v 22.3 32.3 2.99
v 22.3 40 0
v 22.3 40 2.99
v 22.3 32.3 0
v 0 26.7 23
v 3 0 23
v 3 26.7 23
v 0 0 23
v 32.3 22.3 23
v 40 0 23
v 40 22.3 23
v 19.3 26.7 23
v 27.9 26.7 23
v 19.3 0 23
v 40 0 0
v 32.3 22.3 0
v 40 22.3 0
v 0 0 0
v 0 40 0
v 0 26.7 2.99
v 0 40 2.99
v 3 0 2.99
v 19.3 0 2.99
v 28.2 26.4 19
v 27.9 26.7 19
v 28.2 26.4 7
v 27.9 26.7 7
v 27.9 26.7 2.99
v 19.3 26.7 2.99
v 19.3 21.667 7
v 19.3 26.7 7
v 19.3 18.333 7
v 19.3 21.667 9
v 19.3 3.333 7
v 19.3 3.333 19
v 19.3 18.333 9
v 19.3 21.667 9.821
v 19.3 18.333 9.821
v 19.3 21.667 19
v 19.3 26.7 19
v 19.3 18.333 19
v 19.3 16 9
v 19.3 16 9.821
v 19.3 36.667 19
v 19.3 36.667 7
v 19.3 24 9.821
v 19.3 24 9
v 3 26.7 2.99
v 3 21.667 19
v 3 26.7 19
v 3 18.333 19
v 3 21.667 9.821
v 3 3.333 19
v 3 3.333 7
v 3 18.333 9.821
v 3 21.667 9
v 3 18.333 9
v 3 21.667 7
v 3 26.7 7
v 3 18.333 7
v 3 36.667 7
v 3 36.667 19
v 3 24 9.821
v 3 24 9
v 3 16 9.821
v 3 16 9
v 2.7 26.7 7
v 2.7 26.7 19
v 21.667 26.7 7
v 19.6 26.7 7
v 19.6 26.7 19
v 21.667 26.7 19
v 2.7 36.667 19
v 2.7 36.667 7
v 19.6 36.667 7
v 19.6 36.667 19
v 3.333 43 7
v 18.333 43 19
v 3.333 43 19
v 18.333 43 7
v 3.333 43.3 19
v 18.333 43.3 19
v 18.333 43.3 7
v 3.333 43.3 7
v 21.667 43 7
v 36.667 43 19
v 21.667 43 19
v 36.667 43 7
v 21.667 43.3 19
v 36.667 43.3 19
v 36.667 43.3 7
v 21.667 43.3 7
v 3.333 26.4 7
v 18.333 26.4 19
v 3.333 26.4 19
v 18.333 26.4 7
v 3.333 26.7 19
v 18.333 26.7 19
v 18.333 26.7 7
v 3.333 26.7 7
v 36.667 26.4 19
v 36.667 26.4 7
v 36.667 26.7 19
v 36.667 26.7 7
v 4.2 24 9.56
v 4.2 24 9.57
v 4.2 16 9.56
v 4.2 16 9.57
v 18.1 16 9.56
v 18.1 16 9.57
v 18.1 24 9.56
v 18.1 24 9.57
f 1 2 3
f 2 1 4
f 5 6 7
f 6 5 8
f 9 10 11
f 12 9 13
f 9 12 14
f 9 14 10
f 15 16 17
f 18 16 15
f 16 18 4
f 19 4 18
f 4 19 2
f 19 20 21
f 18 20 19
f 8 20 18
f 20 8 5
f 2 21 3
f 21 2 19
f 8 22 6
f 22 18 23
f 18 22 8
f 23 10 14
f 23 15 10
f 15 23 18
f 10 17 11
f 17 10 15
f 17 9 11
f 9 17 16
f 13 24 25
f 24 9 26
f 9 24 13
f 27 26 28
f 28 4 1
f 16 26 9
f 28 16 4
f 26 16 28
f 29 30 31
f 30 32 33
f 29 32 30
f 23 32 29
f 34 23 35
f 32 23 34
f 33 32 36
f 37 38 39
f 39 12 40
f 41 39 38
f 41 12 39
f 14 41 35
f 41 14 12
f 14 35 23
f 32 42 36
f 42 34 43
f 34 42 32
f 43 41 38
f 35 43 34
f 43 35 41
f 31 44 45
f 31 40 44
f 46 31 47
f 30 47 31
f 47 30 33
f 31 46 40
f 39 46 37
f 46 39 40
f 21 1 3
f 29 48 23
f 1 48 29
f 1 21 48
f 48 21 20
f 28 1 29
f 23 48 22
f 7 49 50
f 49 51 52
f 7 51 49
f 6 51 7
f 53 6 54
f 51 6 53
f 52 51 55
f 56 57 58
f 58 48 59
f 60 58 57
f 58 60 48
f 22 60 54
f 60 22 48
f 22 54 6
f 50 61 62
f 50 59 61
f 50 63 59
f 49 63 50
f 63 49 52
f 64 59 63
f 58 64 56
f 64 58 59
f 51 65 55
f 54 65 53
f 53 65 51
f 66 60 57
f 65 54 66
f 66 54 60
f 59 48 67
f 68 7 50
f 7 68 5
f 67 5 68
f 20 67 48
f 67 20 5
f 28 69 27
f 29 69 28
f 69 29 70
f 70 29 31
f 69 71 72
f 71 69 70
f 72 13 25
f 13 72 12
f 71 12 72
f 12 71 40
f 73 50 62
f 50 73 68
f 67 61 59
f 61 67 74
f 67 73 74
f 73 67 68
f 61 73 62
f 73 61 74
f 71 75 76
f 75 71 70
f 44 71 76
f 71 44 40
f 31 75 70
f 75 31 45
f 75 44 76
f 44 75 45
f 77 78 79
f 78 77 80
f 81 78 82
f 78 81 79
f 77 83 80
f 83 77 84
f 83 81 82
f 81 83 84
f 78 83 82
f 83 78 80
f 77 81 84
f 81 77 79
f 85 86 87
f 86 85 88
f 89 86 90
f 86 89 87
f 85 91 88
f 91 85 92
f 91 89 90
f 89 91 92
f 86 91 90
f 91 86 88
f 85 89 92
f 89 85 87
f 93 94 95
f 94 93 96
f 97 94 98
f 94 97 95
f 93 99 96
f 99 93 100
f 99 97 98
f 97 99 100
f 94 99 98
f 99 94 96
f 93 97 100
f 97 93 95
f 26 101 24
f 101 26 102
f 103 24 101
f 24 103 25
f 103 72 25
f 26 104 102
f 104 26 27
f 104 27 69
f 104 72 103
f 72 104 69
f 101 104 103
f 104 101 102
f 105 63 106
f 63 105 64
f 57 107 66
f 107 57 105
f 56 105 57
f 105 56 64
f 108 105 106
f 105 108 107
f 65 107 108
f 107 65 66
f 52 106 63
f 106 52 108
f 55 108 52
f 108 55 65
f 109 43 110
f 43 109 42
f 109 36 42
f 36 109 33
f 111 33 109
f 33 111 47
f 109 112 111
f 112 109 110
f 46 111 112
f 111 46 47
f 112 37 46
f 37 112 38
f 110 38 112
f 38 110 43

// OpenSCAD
// CabinetLOCK — conectores universales para armario con tablero 16mm
// Material: PETG · Impresora: SPARKX i7 · Boquilla: 0.4mm
// Render una pieza: cambiar PIEZA al nombre deseado y exportar STL

// ══════════════════════════════════════════════════════════════
// SELECTOR DE PIEZA (cambiar aquí para renderizar)
// ══════════════════════════════════════════════════════════════
// Valores: "esquina_l", "esquina_3d", "t_interior", "soporte_balda",
//          "recto", "tapon", "union_vertical", "calibracion"
PIEZA = "esquina_l";

// ══════════════════════════════════════════════════════════════
// PARÁMETROS GLOBALES
// ══════════════════════════════════════════════════════════════

// --- Tablero ---
ESPESOR_TABLERO  = 16;      // mm — melamina/contrachapado/MDF/aglomerado
TOLERANCIA_LADO  = 0.15;    // mm por lado → canal = 16 + 2×0.15 = 16.3mm
ANCHO_CANAL      = ESPESOR_TABLERO + 2 * TOLERANCIA_LADO;

// --- Cuerpo del conector ---
PARED            = 3;        // mm espesor de pared mínimo (3 perímetros × 0.4mm + margen)
PROFUNDIDAD_CANAL = 20;     // mm — cuánto entra el tablero en el conector
LARGO_BRAZO      = 40;      // mm — longitud del brazo (ESQUINA-L, T, RECTO)
FILLET           = 1.5;     // mm — radio de acuerdo en esquinas internas de esfuerzo

// --- Snap-fit (cantilever) ---
SNAP_LARGO       = 6;       // mm — longitud del brazo cantilever
SNAP_ESPESOR     = 2.4;     // mm — espesor del brazo
SNAP_DEFLEXION   = 1.2;     // mm — cuánto se deflecta al insertar
SNAP_ANGULO_ENTRADA   = 25; // grados — chaflán de entrada (fácil inserción)
SNAP_ANGULO_RETENCION = 80; // grados — ángulo de retención (difícil extracción)
SNAP_ANCHO       = 8;       // mm — ancho del brazo snap-fit

// --- Nervios anti-rotación ---
RIB_ALTURA       = 0.3;     // mm — interferencia del nervio dentro del canal
RIB_ANCHO        = 1;       // mm — ancho del nervio
RIB_LARGO        = 15;      // mm — largo del nervio (a lo largo del canal)
RIB_CANTIDAD     = 2;       // nervios por cara interior del canal

// --- Soporte balda ---
BALDA_PIN_DIAM   = 5;       // mm — diámetro del pin (estándar europeo)
BALDA_PIN_LARGO  = 8;       // mm — largo del pin que entra en el agujero
BALDA_LABIO      = 3;       // mm — labio de retención de la balda
BALDA_BASE       = 15;      // mm — diámetro de la base del soporte

// --- Derivados ---
ANCHO_EXTERIOR   = ANCHO_CANAL + 2 * PARED;  // 22.3mm

$fn = 40;

// ══════════════════════════════════════════════════════════════
// MÓDULOS AUXILIARES
// ══════════════════════════════════════════════════════════════

// Canal para tablero: un hueco rectangular con las tolerancias aplicadas
// Orientado en Z (el tablero entra desde arriba)
module canal_tablero(profundidad=PROFUNDIDAD_CANAL, largo=LARGO_BRAZO) {
    translate([0, 0, -0.01])
        cube([ANCHO_CANAL, largo, profundidad + 0.01]);
}

// Nervios anti-rotación dentro de un canal
// Se colocan en las paredes internas para crear interferencia
module nervios_anti_rotacion(profundidad=PROFUNDIDAD_CANAL, largo=LARGO_BRAZO) {
    espaciado = (largo - RIB_CANTIDAD * RIB_LARGO) / (RIB_CANTIDAD + 1);

    for (cara = [0, 1]) {        // 0 = pared izquierda, 1 = pared derecha
        for (i = [0 : RIB_CANTIDAD - 1]) {
            pos_y = espaciado + i * (RIB_LARGO + espaciado);
            pos_x = cara == 0 ? -RIB_ALTURA : ANCHO_CANAL;

            translate([pos_x, pos_y, profundidad * 0.2])
                cube([RIB_ALTURA, RIB_LARGO, profundidad * 0.6]);
        }
    }
}

// Brazo snap-fit cantilever
// Nace de una pared y se deflecta hacia el interior del canal
module snap_arm() {
    // Cuerpo del brazo cantilever
    hull() {
        cube([SNAP_ESPESOR, SNAP_ANCHO, 0.01]);
        translate([0, 0, SNAP_LARGO - 0.01])
            cube([SNAP_ESPESOR, SNAP_ANCHO, 0.01]);
    }

    // Gancho de retención
    translate([0, 0, SNAP_LARGO]) {
        // Rampa de entrada (ángulo suave)
        hull() {
            cube([SNAP_ESPESOR, SNAP_ANCHO, 0.01]);
            translate([SNAP_DEFLEXION, 0, SNAP_DEFLEXION * tan(SNAP_ANGULO_ENTRADA)])
                cube([SNAP_ESPESOR, SNAP_ANCHO, 0.01]);
        }
        // Cara de retención (ángulo agresivo)
        hull() {
            translate([SNAP_DEFLEXION, 0, SNAP_DEFLEXION * tan(SNAP_ANGULO_ENTRADA)])
                cube([SNAP_ESPESOR, SNAP_ANCHO, 0.01]);
            translate([SNAP_DEFLEXION, 0, SNAP_DEFLEXION * tan(SNAP_ANGULO_ENTRADA) + 0.5])
                cube([0.01, SNAP_ANCHO, 0.01]);
        }
    }
}

// Par de snap-fits enfrentados dentro de un canal
module snap_pair(profundidad=PROFUNDIDAD_CANAL, largo=LARGO_BRAZO) {
    centro_y = largo / 2 - SNAP_ANCHO / 2;

    // Snap izquierdo (crece hacia +X, dentro del canal)
    translate([PARED - SNAP_ESPESOR, centro_y, 0])
        snap_arm();

    // Snap derecho (espejado, crece hacia -X)
    translate([PARED + ANCHO_CANAL + SNAP_ESPESOR, centro_y + SNAP_ANCHO, 0])
        rotate([0, 0, 180])
            snap_arm();
}

// Fillet 2D como cuarto de cilindro para esquinas internas
module fillet_lineal(radio=FILLET, largo=LARGO_BRAZO) {
    difference() {
        cube([radio, radio, largo]);
        translate([radio, radio, -0.01])
            cylinder(r=radio, h=largo + 0.02);
    }
}

// ══════════════════════════════════════════════════════════════
// PIEZAS
// ══════════════════════════════════════════════════════════════

// --- ESQUINA-L: conecta 2 tableros a 90° (la más común) ---
module esquina_l() {
    alto_total = PROFUNDIDAD_CANAL + PARED;

    difference() {
        union() {
            // Brazo A (horizontal, a lo largo de Y)
            cube([ANCHO_EXTERIOR, LARGO_BRAZO, alto_total]);

            // Brazo B (perpendicular, a lo largo de X)
            cube([LARGO_BRAZO, ANCHO_EXTERIOR, alto_total]);

            // Refuerzo diagonal en la esquina interior
            translate([ANCHO_EXTERIOR, ANCHO_EXTERIOR, 0])
                linear_extrude(alto_total)
                    polygon([
                        [0, 0],
                        [10, 0],
                        [0, 10]
                    ]);
        }

        // Canal A (tablero horizontal entra por Z)
        translate([PARED, 0, PARED])
            canal_tablero(PROFUNDIDAD_CANAL, LARGO_BRAZO);

        // Canal B (tablero vertical entra por Z)
        translate([0, PARED, PARED])
            rotate([0, 0, -90])
                translate([-LARGO_BRAZO, 0, 0])
                    canal_tablero(PROFUNDIDAD_CANAL, LARGO_BRAZO);
    }

    // Nervios en canal A
    translate([PARED, 0, PARED])
        nervios_anti_rotacion(PROFUNDIDAD_CANAL, LARGO_BRAZO);

    // Nervios en canal B
    translate([0, PARED, PARED])
        rotate([0, 0, -90])
            translate([-LARGO_BRAZO, 0, 0])
                nervios_anti_rotacion(PROFUNDIDAD_CANAL, LARGO_BRAZO);

    // Snap-fits canal A
    translate([0, 0, PARED])
        snap_pair(PROFUNDIDAD_CANAL, LARGO_BRAZO);
}

// --- ESQUINA-3D: conecta 3 tableros mutuamente perpendiculares ---
module esquina_3d() {
    alto_total = PROFUNDIDAD_CANAL + PARED;

    difference() {
        union() {
            // Bloque base con los 3 brazos
            // Brazo X
            cube([LARGO_BRAZO, ANCHO_EXTERIOR, alto_total]);
            // Brazo Y
            cube([ANCHO_EXTERIOR, LARGO_BRAZO, alto_total]);
            // Columna Z (el tercer tablero va por arriba)
            cube([ANCHO_EXTERIOR, ANCHO_EXTERIOR, PROFUNDIDAD_CANAL + PARED + PROFUNDIDAD_CANAL]);

            // Refuerzo esquina X-Y
            translate([ANCHO_EXTERIOR, ANCHO_EXTERIOR, 0])
                linear_extrude(alto_total)
                    polygon([[0,0],[8,0],[0,8]]);
        }

        // Canal X (tablero entra por Z, recorre X)
        translate([0, PARED, PARED])
            cube([LARGO_BRAZO, ANCHO_CANAL, PROFUNDIDAD_CANAL + 0.01]);

        // Canal Y (tablero entra por Z, recorre Y)
        translate([PARED, 0, PARED])
            cube([ANCHO_CANAL, LARGO_BRAZO, PROFUNDIDAD_CANAL + 0.01]);

        // Canal Z (tablero entra por arriba, se aloja en la columna)
        translate([PARED, PARED, alto_total])
            cube([ANCHO_CANAL, ANCHO_CANAL, PROFUNDIDAD_CANAL + 0.01]);
    }

    // Nervios canal X
    translate([0, PARED, PARED])
        for (cara = [0, 1]) {
            for (i = [0 : RIB_CANTIDAD - 1]) {
                espaciado = (LARGO_BRAZO - RIB_CANTIDAD * RIB_LARGO) / (RIB_CANTIDAD + 1);
                pos_x = espaciado + i * (RIB_LARGO + espaciado);
                pos_y = cara == 0 ? -RIB_ALTURA : ANCHO_CANAL;
                translate([pos_x, pos_y, PROFUNDIDAD_CANAL * 0.2])
                    cube([RIB_LARGO, RIB_ALTURA, PROFUNDIDAD_CANAL * 0.6]);
            }
        }

    // Nervios canal Y
    translate([PARED, 0, PARED])
        nervios_anti_rotacion(PROFUNDIDAD_CANAL, LARGO_BRAZO);
}

// --- T-INTERIOR: un tablero pasa de largo, otro entra perpendicular ---
module t_interior() {
    alto_total = PROFUNDIDAD_CANAL + PARED;

    difference() {
        union() {
            // Cuerpo principal (el tablero que pasa de largo, a lo largo de Y)
            cube([ANCHO_EXTERIOR, LARGO_BRAZO, alto_total]);

            // Brazo perpendicular (la balda que entra por un lado)
            translate([0, LARGO_BRAZO/2 - ANCHO_EXTERIOR/2, 0])
                cube([LARGO_BRAZO, ANCHO_EXTERIOR, alto_total]);
        }

        // Canal pasante (tablero largo, de punta a punta en Y)
        translate([PARED, -0.01, PARED])
            cube([ANCHO_CANAL, LARGO_BRAZO + 0.02, PROFUNDIDAD_CANAL + 0.01]);

        // Canal ciego perpendicular (balda, entra por +X)
        translate([ANCHO_EXTERIOR, LARGO_BRAZO/2 - ANCHO_CANAL/2, PARED])
            cube([LARGO_BRAZO - ANCHO_EXTERIOR + 0.01, ANCHO_CANAL, PROFUNDIDAD_CANAL + 0.01]);
    }

    // Nervios canal pasante
    translate([PARED, 0, PARED])
        nervios_anti_rotacion(PROFUNDIDAD_CANAL, LARGO_BRAZO);

    // Nervios canal ciego
    translate([ANCHO_EXTERIOR, LARGO_BRAZO/2 - ANCHO_CANAL/2, PARED])
        for (cara = [0, 1]) {
            for (i = [0 : RIB_CANTIDAD - 1]) {
                largo_brazo_perp = LARGO_BRAZO - ANCHO_EXTERIOR;
                espaciado = (largo_brazo_perp - RIB_CANTIDAD * RIB_LARGO) / (RIB_CANTIDAD + 1);
                pos_x = espaciado + i * (RIB_LARGO + espaciado);
                pos_y = cara == 0 ? -RIB_ALTURA : ANCHO_CANAL;
                translate([pos_x, pos_y, PROFUNDIDAD_CANAL * 0.2])
                    cube([RIB_LARGO, RIB_ALTURA, PROFUNDIDAD_CANAL * 0.6]);
            }
        }
}

// --- SOPORTE-BALDA: pin de 5mm + labio de retención ---
module soporte_balda() {
    // Base circular
    cylinder(d=BALDA_BASE, h=PARED);

    // Pin (estándar europeo 5mm)
    translate([0, 0, PARED])
        cylinder(d=BALDA_PIN_DIAM - 0.1, h=BALDA_PIN_LARGO);

    // Labio de apoyo para la balda
    translate([0, 0, PARED]) {
        difference() {
            cylinder(d=BALDA_BASE, h=BALDA_LABIO);
            // Recorte para que la balda apoye en un arco, no círculo completo
            translate([-BALDA_BASE, -BALDA_BASE, -0.01])
                cube([BALDA_BASE * 2, BALDA_BASE * 0.6, BALDA_LABIO + 0.02]);
        }
    }
}

// --- RECTO: une 2 tableros en línea (prolongación) ---
module recto() {
    alto_total = PROFUNDIDAD_CANAL + PARED;
    largo_total = LARGO_BRAZO * 2;

    difference() {
        // Cuerpo
        cube([ANCHO_EXTERIOR, largo_total, alto_total]);

        // Canal A (primer tablero entra por un lado)
        translate([PARED, -0.01, PARED])
            cube([ANCHO_CANAL, LARGO_BRAZO + 0.01, PROFUNDIDAD_CANAL + 0.01]);

        // Canal B (segundo tablero entra por el otro lado)
        translate([PARED, LARGO_BRAZO, PARED])
            cube([ANCHO_CANAL, LARGO_BRAZO + 0.01, PROFUNDIDAD_CANAL + 0.01]);
    }

    // Nervios canal A
    translate([PARED, 0, PARED])
        nervios_anti_rotacion(PROFUNDIDAD_CANAL, LARGO_BRAZO);

    // Nervios canal B
    translate([PARED, LARGO_BRAZO, PARED])
        nervios_anti_rotacion(PROFUNDIDAD_CANAL, LARGO_BRAZO);

    // Snap-fits canal A
    translate([0, 0, PARED])
        snap_pair(PROFUNDIDAD_CANAL, LARGO_BRAZO);

    // Snap-fits canal B
    translate([0, LARGO_BRAZO, PARED])
        snap_pair(PROFUNDIDAD_CANAL, LARGO_BRAZO);
}

// --- TAPÓN: cierra el extremo visible de un tablero ---
module tapon() {
    alto_total = PROFUNDIDAD_CANAL + PARED;
    largo_tapon = 25;  // mm — solo necesita cubrir el canto

    difference() {
        // Cuerpo con borde redondeado
        hull() {
            cube([ANCHO_EXTERIOR, largo_tapon, alto_total - 1]);
            translate([1, 0, alto_total - 1])
                cube([ANCHO_EXTERIOR - 2, largo_tapon, 1]);
        }

        // Canal (el tablero entra por un lado)
        translate([PARED, -0.01, PARED])
            cube([ANCHO_CANAL, largo_tapon * 0.7, PROFUNDIDAD_CANAL + 0.01]);
    }

    // Nervios
    translate([PARED, 0, PARED])
        nervios_anti_rotacion(PROFUNDIDAD_CANAL, largo_tapon * 0.7);

    // Un par de snaps
    translate([0, 0, PARED])
        snap_pair(PROFUNDIDAD_CANAL, largo_tapon * 0.7);
}

// --- UNIÓN VERTICAL: conecta tablero horizontal con vertical (suelo/techo) ---
module union_vertical() {
    alto_total = PROFUNDIDAD_CANAL + PARED;

    difference() {
        union() {
            // Base (tablero horizontal — suelo/techo)
            cube([ANCHO_EXTERIOR, LARGO_BRAZO, alto_total]);

            // Columna (tablero vertical — lateral)
            translate([0, 0, alto_total])
                cube([ANCHO_EXTERIOR, ANCHO_EXTERIOR, PROFUNDIDAD_CANAL]);

            // Refuerzo triangular
            translate([0, ANCHO_EXTERIOR, alto_total])
                linear_extrude(height=1)
                    polygon([
                        [0, 0],
                        [0, 10],
                        [ANCHO_EXTERIOR, 0],
                        [ANCHO_EXTERIOR, 10]
                    ]);
        }

        // Canal horizontal (tablero suelo/techo)
        translate([PARED, -0.01, PARED])
            cube([ANCHO_CANAL, LARGO_BRAZO + 0.02, PROFUNDIDAD_CANAL + 0.01]);

        // Canal vertical (tablero lateral, entra desde arriba)
        translate([PARED, PARED, alto_total])
            cube([ANCHO_CANAL, ANCHO_CANAL, PROFUNDIDAD_CANAL + 0.01]);
    }

    // Nervios canal horizontal
    translate([PARED, 0, PARED])
        nervios_anti_rotacion(PROFUNDIDAD_CANAL, LARGO_BRAZO);
}

// --- TORRE DE CALIBRACIÓN ---
module calibracion() {
    pasos = 8;
    juego_min = 0.05;
    juego_paso = 0.05;
    ancho_celda = 20;
    largo_celda = 25;
    alto = 16;   // simula el espesor del tablero
    base = 3;

    // Base con etiquetas
    cube([ancho_celda * pasos + 10, largo_celda + 20, base]);

    for (i = [0 : pasos - 1]) {
        juego = juego_min + i * juego_paso;
        ancho_ranura = ESPESOR_TABLERO + 2 * juego;
        pos_x = 5 + i * ancho_celda;

        // Paredes de la ranura
        translate([pos_x, 5, base]) {
            // Pared izquierda
            cube([3, largo_celda, alto]);
            // Pared derecha
            translate([3 + ancho_ranura, 0, 0])
                cube([3, largo_celda, alto]);
        }

        // Etiqueta numérica (juego en mm ×100 para leer entero)
        translate([pos_x + ancho_celda/2, largo_celda + 12, base])
            linear_extrude(1)
                text(str(juego * 1000 / 10), size=5, halign="center", valign="center");
    }

    // Tablero de prueba (para insertar en cada ranura)
    translate([0, largo_celda + 25, 0]) {
        cube([ESPESOR_TABLERO, largo_celda, alto]);
        // Etiqueta
        translate([ESPESOR_TABLERO/2, largo_celda + 5, 0])
            linear_extrude(1)
                text("16mm", size=4, halign="center");
    }
}

// ══════════════════════════════════════════════════════════════
// RENDER (según PIEZA seleccionada)
// ══════════════════════════════════════════════════════════════

if (PIEZA == "esquina_l")       esquina_l();
if (PIEZA == "esquina_3d")      esquina_3d();
if (PIEZA == "t_interior")      t_interior();
if (PIEZA == "soporte_balda")   soporte_balda();
if (PIEZA == "recto")           recto();
if (PIEZA == "tapon")           tapon();
if (PIEZA == "union_vertical")  union_vertical();
if (PIEZA == "calibracion")     calibracion();
